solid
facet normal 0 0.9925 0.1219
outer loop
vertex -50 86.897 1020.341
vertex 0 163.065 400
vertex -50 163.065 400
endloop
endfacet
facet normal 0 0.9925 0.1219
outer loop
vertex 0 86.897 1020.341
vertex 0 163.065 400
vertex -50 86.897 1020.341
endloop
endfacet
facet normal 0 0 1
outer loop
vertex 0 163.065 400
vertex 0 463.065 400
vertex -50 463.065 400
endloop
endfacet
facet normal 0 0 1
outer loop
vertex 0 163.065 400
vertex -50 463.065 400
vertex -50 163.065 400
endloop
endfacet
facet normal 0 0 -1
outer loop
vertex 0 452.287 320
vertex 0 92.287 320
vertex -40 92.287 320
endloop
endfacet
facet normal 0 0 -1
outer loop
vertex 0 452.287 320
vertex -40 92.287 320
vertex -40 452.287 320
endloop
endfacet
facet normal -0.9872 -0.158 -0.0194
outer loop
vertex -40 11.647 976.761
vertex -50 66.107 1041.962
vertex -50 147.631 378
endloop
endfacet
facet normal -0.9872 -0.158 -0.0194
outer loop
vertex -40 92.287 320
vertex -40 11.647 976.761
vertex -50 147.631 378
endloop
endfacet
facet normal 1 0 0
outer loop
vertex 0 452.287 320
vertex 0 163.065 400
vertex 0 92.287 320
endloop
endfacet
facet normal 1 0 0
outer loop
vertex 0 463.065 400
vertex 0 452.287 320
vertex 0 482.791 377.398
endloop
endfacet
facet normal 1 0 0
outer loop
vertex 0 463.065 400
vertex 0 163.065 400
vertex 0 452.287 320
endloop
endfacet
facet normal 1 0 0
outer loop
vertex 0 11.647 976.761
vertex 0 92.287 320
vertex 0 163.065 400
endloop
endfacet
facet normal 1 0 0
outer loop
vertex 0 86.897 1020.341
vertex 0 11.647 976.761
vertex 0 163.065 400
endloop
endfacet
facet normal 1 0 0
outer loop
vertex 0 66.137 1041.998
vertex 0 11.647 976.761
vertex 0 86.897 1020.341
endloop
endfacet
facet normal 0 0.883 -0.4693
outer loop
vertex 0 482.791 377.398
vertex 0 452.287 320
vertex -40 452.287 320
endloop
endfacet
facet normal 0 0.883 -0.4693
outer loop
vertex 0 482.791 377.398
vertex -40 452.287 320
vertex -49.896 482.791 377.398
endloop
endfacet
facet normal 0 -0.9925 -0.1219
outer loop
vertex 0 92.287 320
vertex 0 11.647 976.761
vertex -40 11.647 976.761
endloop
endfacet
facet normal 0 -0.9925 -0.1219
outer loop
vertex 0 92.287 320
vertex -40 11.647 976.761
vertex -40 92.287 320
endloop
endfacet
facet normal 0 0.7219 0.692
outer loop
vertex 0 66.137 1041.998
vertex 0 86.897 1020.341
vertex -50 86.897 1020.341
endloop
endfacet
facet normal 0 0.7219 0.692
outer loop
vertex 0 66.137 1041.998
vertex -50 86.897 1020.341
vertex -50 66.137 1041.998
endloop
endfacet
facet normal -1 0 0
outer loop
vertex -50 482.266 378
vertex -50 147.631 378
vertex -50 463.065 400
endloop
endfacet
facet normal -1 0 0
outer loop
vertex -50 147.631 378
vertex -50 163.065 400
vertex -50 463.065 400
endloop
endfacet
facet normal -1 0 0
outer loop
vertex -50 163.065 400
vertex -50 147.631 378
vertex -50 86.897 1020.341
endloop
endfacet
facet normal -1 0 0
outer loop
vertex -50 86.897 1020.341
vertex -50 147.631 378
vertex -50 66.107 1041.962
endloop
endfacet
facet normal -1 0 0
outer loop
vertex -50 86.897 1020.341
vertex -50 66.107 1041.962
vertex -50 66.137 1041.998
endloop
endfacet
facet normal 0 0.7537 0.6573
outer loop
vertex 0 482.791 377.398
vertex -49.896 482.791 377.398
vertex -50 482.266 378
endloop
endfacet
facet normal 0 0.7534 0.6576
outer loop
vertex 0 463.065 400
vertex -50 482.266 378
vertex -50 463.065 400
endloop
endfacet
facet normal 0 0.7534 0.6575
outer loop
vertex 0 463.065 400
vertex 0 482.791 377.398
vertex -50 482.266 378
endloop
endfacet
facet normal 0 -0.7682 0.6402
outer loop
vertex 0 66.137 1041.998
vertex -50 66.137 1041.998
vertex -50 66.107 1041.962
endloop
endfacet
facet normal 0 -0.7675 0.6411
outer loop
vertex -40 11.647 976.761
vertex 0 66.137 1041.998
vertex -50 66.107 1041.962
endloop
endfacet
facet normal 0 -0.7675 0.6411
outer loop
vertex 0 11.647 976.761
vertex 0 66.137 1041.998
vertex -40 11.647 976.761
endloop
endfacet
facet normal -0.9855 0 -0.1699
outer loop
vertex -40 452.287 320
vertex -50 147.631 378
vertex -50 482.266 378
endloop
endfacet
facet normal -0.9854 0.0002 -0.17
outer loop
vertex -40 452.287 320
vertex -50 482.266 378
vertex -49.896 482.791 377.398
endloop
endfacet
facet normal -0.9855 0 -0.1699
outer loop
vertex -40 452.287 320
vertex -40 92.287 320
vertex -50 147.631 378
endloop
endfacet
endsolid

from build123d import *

# Parameters (mm, degrees)
F1_DEPTH = 50
F2_SIZE2 = 10
F2_SIZE  = 58
F3_SIZE2 = 62
F3_SIZE  = 10


with BuildPart() as f1:
    # F0 (on Right) → F1 (new body)
    with BuildSketch(Plane.YZ):
        Polygon((482.7914457609, 377.3975717771), (463.0650614387, 400), (163.0650614387, 400), (86.8967218104, 1020.3413447758), (66.1366664017, 1041.9982166512), (11.6469021237, 976.7612210971), (92.2870402742, 320), (452.2870402742, 320), align=None)
    extrude(amount=-F1_DEPTH)

    # F2
    f2_edges = [f1.edges().sort_by_distance(p)[0] for p in [
        (-50, 272.28704, 320),
    ]]
    f2_side = f1.faces().sort_by_distance((-50, 466.432885, 383.02992))[0]
    chamfer(f2_edges, length=F2_SIZE, length2=F2_SIZE2, reference=f2_side)

    # F3
    f3_edges = [f1.edges().sort_by_distance(p)[0] for p in [
        (-50, 48.406219, 677.380611),
    ]]
    f3_side = f1.faces().sort_by_distance((-24.806952, 51.628874, 651.134191))[0]
    chamfer(f3_edges, length=F3_SIZE, length2=F3_SIZE2, reference=f3_side)


solid = f1.part
